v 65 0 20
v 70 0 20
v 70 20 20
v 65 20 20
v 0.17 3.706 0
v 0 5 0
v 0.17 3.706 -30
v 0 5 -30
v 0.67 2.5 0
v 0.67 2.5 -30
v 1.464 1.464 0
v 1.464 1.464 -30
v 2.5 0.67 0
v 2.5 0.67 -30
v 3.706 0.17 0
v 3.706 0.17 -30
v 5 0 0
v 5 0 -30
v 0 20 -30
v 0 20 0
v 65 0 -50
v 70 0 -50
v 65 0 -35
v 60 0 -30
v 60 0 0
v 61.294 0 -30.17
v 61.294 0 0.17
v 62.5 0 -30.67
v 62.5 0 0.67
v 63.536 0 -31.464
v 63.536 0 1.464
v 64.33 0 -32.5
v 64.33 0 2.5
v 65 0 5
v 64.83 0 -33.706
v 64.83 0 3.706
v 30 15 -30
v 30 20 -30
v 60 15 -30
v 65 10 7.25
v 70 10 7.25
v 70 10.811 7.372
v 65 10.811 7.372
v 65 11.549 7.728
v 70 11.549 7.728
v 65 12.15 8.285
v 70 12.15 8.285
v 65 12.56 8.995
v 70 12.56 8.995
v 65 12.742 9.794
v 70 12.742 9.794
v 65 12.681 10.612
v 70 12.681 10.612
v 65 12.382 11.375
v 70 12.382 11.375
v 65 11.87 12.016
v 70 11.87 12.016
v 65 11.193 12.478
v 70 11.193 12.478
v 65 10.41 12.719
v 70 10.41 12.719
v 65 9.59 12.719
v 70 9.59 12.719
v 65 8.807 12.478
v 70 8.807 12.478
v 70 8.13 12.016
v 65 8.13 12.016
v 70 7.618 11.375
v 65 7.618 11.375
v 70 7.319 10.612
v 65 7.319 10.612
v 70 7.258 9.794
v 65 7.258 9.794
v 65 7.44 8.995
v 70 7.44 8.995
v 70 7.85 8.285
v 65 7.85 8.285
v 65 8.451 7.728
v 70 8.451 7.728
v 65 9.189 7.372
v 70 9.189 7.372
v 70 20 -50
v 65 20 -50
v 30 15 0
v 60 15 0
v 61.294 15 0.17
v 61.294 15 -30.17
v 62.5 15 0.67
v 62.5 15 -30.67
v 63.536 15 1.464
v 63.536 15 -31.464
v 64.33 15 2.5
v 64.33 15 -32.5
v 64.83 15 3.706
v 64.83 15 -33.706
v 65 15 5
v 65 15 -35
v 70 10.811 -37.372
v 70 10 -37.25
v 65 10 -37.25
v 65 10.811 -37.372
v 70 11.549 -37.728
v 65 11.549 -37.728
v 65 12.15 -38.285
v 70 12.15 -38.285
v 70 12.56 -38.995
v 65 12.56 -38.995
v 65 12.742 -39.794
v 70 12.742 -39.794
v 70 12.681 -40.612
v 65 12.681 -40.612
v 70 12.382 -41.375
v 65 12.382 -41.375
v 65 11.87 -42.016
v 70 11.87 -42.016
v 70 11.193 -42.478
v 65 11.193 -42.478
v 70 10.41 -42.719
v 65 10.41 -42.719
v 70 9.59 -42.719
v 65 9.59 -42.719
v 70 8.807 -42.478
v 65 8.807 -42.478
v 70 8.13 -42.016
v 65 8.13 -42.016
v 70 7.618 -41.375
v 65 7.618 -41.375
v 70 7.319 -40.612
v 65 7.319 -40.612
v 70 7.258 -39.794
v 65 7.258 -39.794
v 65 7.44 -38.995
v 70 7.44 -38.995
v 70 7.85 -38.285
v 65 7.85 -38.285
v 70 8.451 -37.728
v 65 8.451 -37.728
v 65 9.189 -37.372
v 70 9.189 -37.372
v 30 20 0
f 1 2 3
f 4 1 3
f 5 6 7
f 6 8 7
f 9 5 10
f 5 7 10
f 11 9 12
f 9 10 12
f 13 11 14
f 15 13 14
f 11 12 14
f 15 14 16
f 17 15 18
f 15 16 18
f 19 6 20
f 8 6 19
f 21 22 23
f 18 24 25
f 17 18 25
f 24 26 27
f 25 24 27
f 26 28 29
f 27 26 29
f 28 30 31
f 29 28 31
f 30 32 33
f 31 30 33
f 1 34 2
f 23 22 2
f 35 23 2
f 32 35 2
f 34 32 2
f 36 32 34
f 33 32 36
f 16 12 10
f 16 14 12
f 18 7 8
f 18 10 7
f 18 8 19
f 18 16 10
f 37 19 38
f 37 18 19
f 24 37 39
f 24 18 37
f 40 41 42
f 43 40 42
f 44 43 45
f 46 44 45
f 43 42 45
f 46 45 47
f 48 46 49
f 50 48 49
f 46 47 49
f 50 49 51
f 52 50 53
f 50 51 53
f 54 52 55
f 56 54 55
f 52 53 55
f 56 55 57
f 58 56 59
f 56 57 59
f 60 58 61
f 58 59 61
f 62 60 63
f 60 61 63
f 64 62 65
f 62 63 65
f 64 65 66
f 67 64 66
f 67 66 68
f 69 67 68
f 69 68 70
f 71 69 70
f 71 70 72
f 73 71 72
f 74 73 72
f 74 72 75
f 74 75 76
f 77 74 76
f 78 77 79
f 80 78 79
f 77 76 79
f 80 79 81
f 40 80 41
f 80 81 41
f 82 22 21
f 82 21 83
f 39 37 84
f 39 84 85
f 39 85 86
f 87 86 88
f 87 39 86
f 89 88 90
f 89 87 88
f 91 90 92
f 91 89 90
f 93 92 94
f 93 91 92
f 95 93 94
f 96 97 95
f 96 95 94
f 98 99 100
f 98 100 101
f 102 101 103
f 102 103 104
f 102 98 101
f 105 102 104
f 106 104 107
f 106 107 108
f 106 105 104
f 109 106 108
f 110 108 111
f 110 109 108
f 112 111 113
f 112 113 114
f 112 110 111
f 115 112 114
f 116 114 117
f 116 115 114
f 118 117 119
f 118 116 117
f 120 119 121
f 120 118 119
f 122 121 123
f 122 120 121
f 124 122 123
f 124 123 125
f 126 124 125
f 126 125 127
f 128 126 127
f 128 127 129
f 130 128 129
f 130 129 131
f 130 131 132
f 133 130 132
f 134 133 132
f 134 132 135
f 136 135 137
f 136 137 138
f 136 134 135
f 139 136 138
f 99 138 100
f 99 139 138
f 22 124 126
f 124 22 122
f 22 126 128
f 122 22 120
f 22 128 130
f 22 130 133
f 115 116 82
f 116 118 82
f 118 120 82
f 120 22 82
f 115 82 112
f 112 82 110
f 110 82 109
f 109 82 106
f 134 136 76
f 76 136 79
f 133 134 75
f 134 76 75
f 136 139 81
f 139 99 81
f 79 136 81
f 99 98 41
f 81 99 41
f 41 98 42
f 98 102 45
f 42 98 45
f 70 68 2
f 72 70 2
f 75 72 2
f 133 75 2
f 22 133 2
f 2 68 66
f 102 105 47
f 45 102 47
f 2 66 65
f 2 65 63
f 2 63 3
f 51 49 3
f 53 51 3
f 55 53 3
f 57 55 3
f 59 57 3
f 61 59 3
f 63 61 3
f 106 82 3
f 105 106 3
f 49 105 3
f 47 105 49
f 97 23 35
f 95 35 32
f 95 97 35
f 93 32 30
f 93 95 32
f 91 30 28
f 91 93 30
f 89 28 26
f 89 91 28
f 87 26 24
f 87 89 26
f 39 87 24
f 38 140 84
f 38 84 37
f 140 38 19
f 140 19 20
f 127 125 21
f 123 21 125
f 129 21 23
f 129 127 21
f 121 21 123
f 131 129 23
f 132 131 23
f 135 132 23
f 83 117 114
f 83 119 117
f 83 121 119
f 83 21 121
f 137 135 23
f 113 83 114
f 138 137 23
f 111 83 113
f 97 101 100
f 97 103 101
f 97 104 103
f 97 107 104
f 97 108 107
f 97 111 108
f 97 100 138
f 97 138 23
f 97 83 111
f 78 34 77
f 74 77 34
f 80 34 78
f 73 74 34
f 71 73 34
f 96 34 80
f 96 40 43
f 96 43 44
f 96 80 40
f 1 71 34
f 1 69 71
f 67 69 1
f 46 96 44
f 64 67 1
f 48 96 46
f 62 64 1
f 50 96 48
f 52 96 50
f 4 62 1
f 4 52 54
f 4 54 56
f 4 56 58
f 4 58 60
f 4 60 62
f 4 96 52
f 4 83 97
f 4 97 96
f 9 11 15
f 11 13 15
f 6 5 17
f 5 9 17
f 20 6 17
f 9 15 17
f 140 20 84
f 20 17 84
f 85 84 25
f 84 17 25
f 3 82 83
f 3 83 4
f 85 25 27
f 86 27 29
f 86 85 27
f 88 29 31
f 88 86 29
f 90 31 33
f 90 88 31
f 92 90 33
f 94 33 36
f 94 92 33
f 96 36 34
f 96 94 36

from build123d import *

# Parameters (mm, degrees)
SKETCH1_W           = 70
SKETCH1_H           = 30
BOSS_EXTRUDE1_DEPTH = 20
SKETCH8_W           = 20
SKETCH8_H           = 20
SKETCH8_R           = 2.75
BOSS_EXTRUDE5_DEPTH = 5
FILLET3_R           = 5
SKETCH9_W           = 35
SKETCH9_H           = 40
CUT_EXTRUDE5_DEPTH  = 5


with BuildPart() as part:
    # Sketch1 → Boss-Extrude1 (new body)
    with BuildSketch(Plane(origin=(0, 0, 0), x_dir=(1, 0, 0), z_dir=(0, 1, 0))):
        with Locations((35, 15)):
            Rectangle(SKETCH1_W, SKETCH1_H)
    extrude(amount=BOSS_EXTRUDE1_DEPTH)

    # Sketch8 → Boss-Extrude5 (add)
    with BuildSketch(Plane(origin=(70, 0, 0), x_dir=(0, 0, -1), z_dir=(1, 0, 0))):
        with Locations((-10, 10)):
            Rectangle(SKETCH8_W, SKETCH8_H)
        with Locations((-10, 10)):
            Circle(SKETCH8_R, mode=Mode.SUBTRACT)
    boss_extrude5 = extrude(amount=-BOSS_EXTRUDE5_DEPTH)

    # Mirror1: Boss-Extrude5 across plane
    add(boss_extrude5.mirror(Plane.XY.offset(-15)))

    # Fillet3
    fillet3_edges = [part.edges().sort_by_distance(p)[0] for p in [
        (65, 10, 0),
        (65, 10, -30),
        (0, 0, -15),
    ]]
    fillet(fillet3_edges, radius=FILLET3_R)

    # Sketch9 → Cut-Extrude5 (cut)
    with BuildSketch(Plane(origin=(0, 20, 0), x_dir=(1, 0, 0), z_dir=(0, 1, 0))):
        with Locations((47.5, 15)):
            Rectangle(SKETCH9_W, SKETCH9_H)
    extrude(amount=-CUT_EXTRUDE5_DEPTH, mode=Mode.SUBTRACT)


solid = part.part
